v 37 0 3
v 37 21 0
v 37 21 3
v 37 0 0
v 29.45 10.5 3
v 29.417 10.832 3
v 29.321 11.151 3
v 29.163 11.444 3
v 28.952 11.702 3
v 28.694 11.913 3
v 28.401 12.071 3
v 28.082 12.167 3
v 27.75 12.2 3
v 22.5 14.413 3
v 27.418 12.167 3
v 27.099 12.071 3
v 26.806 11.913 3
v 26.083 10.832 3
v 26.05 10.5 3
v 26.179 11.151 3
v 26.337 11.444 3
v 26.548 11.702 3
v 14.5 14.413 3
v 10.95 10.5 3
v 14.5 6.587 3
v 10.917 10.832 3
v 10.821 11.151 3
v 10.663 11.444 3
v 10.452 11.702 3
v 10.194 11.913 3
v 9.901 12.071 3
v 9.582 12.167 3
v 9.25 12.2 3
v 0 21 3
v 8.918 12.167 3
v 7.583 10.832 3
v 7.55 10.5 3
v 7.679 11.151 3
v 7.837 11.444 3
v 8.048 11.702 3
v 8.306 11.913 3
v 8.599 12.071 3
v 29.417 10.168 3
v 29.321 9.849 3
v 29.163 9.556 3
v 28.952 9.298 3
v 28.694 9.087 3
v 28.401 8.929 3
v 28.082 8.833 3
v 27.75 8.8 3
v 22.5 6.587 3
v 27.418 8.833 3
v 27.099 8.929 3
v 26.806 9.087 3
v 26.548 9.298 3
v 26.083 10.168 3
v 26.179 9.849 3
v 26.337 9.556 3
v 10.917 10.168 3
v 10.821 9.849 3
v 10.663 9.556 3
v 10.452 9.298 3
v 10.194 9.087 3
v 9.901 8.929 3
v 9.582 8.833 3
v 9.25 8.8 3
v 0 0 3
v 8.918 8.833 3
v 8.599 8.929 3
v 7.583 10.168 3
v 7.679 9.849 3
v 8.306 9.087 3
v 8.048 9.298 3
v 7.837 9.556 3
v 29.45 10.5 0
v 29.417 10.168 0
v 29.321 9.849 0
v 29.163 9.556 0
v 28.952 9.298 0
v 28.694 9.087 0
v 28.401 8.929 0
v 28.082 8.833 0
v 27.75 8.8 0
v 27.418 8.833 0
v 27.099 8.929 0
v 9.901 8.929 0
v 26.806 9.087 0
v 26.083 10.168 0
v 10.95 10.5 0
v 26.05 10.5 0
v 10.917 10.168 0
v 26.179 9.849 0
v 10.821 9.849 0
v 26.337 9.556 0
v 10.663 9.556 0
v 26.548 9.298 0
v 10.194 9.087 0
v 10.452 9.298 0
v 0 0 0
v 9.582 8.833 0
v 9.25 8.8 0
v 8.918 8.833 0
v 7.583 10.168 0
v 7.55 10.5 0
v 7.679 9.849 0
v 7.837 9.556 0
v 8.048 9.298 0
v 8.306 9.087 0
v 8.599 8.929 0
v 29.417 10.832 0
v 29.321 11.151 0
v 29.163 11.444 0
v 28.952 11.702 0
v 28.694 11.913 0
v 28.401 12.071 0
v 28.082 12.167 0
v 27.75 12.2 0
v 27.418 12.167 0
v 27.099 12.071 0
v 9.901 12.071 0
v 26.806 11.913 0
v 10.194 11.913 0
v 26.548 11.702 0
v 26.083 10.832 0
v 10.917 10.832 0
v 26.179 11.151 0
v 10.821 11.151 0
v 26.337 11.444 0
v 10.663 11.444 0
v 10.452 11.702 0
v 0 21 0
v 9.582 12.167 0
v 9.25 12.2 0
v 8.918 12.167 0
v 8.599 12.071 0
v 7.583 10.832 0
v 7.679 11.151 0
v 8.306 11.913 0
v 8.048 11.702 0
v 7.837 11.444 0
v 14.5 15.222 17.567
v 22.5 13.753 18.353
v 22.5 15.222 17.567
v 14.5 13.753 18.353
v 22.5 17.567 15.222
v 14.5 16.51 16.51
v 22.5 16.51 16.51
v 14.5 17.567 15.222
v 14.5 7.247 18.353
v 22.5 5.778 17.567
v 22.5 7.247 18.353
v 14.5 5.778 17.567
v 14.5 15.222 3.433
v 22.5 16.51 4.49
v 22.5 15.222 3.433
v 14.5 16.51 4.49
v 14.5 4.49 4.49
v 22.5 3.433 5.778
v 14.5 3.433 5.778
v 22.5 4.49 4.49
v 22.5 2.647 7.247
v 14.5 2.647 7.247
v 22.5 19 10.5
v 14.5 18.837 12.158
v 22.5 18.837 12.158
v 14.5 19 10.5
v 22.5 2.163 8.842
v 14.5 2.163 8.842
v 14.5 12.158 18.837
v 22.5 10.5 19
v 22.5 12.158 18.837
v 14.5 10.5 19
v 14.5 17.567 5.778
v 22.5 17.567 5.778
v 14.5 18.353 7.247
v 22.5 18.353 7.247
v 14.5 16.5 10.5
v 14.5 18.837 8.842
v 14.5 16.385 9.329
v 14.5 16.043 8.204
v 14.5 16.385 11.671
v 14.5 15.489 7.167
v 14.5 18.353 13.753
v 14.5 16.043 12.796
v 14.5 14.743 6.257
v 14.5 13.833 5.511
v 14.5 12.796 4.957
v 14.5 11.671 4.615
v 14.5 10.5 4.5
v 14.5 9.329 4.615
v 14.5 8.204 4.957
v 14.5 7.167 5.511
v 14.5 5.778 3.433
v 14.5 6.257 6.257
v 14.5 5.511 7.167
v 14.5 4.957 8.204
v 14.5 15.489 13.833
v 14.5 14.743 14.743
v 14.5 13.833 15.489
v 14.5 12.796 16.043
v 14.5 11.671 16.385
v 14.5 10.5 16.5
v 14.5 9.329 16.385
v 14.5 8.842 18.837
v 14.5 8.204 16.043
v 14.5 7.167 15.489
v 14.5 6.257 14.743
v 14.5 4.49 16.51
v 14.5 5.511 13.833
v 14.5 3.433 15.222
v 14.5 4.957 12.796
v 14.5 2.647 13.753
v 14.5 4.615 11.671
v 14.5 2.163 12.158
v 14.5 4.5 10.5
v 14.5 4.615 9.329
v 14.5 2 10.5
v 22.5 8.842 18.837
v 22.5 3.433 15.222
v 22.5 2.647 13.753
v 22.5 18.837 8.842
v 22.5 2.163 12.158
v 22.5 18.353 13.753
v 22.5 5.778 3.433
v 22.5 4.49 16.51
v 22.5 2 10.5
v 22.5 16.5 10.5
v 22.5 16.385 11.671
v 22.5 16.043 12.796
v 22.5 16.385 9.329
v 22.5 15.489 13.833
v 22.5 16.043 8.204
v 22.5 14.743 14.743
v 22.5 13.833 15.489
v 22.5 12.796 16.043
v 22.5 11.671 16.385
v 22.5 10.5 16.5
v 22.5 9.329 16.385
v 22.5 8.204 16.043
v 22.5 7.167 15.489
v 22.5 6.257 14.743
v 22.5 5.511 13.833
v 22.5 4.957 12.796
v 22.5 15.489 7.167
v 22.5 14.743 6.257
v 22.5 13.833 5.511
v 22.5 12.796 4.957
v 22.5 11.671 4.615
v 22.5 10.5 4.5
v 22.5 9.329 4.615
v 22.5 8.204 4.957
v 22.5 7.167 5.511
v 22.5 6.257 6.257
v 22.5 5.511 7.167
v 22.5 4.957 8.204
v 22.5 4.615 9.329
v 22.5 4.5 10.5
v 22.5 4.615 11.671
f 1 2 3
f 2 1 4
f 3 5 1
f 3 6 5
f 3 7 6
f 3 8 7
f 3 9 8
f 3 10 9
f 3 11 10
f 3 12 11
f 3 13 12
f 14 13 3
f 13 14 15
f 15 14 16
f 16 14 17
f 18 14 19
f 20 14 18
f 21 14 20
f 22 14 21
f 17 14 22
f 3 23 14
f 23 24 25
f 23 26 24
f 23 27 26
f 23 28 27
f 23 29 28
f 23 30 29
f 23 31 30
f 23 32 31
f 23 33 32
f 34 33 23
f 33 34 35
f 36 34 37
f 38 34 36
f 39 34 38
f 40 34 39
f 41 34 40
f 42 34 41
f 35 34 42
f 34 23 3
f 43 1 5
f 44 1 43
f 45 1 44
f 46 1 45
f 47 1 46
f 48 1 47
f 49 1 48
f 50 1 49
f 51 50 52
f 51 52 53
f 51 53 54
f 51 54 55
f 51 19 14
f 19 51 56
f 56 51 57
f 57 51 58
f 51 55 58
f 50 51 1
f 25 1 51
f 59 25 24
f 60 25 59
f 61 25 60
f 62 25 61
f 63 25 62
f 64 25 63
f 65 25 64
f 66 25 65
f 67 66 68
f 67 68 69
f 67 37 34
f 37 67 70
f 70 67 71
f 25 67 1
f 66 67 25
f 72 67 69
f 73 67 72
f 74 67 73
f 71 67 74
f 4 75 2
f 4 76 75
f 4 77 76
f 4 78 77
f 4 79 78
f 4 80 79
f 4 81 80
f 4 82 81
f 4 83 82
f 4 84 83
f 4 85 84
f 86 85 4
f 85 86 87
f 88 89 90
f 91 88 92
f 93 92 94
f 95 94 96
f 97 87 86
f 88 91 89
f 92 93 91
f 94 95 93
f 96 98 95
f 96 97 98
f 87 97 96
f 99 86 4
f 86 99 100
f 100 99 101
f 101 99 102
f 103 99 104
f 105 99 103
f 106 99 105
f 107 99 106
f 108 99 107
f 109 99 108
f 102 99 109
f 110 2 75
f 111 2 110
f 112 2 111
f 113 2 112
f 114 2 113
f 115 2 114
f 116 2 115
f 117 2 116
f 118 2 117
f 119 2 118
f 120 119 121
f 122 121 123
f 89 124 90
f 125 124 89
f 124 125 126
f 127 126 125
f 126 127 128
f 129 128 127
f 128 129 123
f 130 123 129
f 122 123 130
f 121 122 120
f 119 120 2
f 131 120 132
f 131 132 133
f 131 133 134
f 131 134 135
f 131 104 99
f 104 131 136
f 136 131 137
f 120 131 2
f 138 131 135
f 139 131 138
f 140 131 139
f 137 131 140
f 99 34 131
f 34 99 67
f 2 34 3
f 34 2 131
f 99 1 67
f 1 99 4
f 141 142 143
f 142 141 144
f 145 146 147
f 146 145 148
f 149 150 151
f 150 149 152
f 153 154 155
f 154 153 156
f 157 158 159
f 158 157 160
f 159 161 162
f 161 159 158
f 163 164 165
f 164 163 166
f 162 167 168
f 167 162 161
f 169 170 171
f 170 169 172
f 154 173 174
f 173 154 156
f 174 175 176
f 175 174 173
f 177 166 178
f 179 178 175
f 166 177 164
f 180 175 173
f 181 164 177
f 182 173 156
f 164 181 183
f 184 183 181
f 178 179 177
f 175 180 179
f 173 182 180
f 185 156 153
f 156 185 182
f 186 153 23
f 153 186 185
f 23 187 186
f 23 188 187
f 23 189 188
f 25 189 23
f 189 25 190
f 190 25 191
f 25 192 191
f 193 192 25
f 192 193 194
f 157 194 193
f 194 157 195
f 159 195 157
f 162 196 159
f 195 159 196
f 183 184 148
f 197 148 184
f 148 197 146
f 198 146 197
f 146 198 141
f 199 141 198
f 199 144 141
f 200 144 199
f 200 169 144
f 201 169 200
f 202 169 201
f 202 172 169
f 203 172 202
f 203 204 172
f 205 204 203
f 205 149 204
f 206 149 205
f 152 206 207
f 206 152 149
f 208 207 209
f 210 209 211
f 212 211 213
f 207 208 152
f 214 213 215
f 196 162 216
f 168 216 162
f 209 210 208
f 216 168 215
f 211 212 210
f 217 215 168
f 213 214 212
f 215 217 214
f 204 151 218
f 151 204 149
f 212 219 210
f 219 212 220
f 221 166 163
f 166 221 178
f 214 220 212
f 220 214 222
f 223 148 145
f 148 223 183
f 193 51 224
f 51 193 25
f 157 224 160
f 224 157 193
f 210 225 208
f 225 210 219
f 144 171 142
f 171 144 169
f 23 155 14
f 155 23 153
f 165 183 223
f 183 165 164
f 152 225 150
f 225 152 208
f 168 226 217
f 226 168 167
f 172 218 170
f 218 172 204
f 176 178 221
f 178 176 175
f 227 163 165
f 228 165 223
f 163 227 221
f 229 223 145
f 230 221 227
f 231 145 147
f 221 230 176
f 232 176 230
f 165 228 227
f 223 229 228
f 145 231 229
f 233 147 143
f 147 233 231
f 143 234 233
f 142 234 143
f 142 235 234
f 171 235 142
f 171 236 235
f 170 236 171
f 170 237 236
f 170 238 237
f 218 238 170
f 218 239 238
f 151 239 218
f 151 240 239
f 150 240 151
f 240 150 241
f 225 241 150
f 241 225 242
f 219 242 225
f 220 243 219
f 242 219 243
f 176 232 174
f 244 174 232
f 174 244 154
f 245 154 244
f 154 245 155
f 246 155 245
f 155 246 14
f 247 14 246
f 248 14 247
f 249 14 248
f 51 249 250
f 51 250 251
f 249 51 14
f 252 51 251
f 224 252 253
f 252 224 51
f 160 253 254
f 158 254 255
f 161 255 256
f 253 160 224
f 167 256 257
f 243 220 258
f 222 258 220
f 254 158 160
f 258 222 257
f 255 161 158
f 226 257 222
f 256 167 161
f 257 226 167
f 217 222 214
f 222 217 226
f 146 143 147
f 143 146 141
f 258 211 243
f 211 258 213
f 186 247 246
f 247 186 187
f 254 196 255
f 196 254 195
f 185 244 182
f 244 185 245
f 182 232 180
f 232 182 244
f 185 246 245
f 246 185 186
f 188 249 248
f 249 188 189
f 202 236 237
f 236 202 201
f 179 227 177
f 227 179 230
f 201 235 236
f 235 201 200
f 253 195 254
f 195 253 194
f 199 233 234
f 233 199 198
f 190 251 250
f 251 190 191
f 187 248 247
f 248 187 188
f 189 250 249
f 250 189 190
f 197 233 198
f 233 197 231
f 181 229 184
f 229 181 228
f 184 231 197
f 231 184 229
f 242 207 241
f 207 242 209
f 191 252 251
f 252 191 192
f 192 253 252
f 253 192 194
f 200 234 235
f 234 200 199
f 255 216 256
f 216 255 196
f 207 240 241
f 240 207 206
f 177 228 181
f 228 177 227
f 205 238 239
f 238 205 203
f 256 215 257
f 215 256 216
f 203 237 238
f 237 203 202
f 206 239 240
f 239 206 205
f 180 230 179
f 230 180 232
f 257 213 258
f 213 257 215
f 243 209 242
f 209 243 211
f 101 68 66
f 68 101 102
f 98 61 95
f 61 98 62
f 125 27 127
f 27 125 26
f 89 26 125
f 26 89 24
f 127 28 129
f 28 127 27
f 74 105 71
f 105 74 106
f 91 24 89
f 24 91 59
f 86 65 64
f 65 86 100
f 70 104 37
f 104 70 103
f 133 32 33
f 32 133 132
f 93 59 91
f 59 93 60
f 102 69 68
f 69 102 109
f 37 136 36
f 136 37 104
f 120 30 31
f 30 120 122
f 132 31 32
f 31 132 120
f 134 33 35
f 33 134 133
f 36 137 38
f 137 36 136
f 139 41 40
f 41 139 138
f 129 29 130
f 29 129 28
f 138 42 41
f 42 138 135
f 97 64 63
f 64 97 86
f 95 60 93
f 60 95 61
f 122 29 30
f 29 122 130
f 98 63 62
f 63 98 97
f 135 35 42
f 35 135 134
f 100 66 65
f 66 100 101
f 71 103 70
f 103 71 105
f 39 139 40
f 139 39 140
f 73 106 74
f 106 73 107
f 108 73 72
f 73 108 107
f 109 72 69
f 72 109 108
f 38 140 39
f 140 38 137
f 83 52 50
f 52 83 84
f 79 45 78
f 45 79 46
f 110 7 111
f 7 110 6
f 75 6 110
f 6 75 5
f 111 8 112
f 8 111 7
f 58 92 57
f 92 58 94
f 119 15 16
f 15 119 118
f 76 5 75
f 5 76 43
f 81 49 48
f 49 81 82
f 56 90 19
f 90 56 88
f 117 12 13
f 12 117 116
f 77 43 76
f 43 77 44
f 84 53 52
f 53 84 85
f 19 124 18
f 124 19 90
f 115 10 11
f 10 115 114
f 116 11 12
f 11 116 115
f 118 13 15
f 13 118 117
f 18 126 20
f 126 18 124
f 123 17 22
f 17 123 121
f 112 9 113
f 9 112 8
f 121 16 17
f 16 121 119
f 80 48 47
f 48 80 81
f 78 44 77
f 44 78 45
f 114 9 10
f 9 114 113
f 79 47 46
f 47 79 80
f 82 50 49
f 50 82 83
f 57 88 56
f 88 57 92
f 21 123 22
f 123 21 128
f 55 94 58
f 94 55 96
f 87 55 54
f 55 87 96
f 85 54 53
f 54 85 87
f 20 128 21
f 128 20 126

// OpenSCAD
$fn = 32;

// ----------------------------------------------------------------------
// Cable clip: cable 12 mm, clamp 17 mm, base 37 mm
// ----------------------------------------------------------------------

// --- parameters (mm) ---
plate_x = 37;             // base length, X
plate_y = 21;             // base width, Y
plate_t = 3;              // base thickness
wire_seat_d = 17;         // clamp outside diameter
clip_t = 2.5;             // clamp wall
cable_d = 12;             // cable opening
ring_w = 8;               // clamp width along the cable
screw_d = 3.4;            // screw clearance
sink = 1;                 // overlap of the clamp into the base

module base() {
  cube([plate_x, plate_y, plate_t]);
}

module clamp() {
  translate([plate_x / 2, plate_y / 2, plate_t + wire_seat_d / 2 - sink]) rotate([0, 90, 0])
    cylinder(h = ring_w, d = wire_seat_d, center = true);
}

difference() {
  union() {
    base();
    clamp();
  }
  translate([plate_x / 2, plate_y / 2, plate_t + wire_seat_d / 2 - sink]) rotate([0, 90, 0]) translate([0, 0, -ring_w / 2 - 1]) cylinder(h = ring_w + 2, d = cable_d);
  translate([9.25, plate_y / 2, -1]) cylinder(h = plate_t + 2, d = screw_d);
  translate([27.75, plate_y / 2, -1]) cylinder(h = plate_t + 2, d = screw_d);
}
